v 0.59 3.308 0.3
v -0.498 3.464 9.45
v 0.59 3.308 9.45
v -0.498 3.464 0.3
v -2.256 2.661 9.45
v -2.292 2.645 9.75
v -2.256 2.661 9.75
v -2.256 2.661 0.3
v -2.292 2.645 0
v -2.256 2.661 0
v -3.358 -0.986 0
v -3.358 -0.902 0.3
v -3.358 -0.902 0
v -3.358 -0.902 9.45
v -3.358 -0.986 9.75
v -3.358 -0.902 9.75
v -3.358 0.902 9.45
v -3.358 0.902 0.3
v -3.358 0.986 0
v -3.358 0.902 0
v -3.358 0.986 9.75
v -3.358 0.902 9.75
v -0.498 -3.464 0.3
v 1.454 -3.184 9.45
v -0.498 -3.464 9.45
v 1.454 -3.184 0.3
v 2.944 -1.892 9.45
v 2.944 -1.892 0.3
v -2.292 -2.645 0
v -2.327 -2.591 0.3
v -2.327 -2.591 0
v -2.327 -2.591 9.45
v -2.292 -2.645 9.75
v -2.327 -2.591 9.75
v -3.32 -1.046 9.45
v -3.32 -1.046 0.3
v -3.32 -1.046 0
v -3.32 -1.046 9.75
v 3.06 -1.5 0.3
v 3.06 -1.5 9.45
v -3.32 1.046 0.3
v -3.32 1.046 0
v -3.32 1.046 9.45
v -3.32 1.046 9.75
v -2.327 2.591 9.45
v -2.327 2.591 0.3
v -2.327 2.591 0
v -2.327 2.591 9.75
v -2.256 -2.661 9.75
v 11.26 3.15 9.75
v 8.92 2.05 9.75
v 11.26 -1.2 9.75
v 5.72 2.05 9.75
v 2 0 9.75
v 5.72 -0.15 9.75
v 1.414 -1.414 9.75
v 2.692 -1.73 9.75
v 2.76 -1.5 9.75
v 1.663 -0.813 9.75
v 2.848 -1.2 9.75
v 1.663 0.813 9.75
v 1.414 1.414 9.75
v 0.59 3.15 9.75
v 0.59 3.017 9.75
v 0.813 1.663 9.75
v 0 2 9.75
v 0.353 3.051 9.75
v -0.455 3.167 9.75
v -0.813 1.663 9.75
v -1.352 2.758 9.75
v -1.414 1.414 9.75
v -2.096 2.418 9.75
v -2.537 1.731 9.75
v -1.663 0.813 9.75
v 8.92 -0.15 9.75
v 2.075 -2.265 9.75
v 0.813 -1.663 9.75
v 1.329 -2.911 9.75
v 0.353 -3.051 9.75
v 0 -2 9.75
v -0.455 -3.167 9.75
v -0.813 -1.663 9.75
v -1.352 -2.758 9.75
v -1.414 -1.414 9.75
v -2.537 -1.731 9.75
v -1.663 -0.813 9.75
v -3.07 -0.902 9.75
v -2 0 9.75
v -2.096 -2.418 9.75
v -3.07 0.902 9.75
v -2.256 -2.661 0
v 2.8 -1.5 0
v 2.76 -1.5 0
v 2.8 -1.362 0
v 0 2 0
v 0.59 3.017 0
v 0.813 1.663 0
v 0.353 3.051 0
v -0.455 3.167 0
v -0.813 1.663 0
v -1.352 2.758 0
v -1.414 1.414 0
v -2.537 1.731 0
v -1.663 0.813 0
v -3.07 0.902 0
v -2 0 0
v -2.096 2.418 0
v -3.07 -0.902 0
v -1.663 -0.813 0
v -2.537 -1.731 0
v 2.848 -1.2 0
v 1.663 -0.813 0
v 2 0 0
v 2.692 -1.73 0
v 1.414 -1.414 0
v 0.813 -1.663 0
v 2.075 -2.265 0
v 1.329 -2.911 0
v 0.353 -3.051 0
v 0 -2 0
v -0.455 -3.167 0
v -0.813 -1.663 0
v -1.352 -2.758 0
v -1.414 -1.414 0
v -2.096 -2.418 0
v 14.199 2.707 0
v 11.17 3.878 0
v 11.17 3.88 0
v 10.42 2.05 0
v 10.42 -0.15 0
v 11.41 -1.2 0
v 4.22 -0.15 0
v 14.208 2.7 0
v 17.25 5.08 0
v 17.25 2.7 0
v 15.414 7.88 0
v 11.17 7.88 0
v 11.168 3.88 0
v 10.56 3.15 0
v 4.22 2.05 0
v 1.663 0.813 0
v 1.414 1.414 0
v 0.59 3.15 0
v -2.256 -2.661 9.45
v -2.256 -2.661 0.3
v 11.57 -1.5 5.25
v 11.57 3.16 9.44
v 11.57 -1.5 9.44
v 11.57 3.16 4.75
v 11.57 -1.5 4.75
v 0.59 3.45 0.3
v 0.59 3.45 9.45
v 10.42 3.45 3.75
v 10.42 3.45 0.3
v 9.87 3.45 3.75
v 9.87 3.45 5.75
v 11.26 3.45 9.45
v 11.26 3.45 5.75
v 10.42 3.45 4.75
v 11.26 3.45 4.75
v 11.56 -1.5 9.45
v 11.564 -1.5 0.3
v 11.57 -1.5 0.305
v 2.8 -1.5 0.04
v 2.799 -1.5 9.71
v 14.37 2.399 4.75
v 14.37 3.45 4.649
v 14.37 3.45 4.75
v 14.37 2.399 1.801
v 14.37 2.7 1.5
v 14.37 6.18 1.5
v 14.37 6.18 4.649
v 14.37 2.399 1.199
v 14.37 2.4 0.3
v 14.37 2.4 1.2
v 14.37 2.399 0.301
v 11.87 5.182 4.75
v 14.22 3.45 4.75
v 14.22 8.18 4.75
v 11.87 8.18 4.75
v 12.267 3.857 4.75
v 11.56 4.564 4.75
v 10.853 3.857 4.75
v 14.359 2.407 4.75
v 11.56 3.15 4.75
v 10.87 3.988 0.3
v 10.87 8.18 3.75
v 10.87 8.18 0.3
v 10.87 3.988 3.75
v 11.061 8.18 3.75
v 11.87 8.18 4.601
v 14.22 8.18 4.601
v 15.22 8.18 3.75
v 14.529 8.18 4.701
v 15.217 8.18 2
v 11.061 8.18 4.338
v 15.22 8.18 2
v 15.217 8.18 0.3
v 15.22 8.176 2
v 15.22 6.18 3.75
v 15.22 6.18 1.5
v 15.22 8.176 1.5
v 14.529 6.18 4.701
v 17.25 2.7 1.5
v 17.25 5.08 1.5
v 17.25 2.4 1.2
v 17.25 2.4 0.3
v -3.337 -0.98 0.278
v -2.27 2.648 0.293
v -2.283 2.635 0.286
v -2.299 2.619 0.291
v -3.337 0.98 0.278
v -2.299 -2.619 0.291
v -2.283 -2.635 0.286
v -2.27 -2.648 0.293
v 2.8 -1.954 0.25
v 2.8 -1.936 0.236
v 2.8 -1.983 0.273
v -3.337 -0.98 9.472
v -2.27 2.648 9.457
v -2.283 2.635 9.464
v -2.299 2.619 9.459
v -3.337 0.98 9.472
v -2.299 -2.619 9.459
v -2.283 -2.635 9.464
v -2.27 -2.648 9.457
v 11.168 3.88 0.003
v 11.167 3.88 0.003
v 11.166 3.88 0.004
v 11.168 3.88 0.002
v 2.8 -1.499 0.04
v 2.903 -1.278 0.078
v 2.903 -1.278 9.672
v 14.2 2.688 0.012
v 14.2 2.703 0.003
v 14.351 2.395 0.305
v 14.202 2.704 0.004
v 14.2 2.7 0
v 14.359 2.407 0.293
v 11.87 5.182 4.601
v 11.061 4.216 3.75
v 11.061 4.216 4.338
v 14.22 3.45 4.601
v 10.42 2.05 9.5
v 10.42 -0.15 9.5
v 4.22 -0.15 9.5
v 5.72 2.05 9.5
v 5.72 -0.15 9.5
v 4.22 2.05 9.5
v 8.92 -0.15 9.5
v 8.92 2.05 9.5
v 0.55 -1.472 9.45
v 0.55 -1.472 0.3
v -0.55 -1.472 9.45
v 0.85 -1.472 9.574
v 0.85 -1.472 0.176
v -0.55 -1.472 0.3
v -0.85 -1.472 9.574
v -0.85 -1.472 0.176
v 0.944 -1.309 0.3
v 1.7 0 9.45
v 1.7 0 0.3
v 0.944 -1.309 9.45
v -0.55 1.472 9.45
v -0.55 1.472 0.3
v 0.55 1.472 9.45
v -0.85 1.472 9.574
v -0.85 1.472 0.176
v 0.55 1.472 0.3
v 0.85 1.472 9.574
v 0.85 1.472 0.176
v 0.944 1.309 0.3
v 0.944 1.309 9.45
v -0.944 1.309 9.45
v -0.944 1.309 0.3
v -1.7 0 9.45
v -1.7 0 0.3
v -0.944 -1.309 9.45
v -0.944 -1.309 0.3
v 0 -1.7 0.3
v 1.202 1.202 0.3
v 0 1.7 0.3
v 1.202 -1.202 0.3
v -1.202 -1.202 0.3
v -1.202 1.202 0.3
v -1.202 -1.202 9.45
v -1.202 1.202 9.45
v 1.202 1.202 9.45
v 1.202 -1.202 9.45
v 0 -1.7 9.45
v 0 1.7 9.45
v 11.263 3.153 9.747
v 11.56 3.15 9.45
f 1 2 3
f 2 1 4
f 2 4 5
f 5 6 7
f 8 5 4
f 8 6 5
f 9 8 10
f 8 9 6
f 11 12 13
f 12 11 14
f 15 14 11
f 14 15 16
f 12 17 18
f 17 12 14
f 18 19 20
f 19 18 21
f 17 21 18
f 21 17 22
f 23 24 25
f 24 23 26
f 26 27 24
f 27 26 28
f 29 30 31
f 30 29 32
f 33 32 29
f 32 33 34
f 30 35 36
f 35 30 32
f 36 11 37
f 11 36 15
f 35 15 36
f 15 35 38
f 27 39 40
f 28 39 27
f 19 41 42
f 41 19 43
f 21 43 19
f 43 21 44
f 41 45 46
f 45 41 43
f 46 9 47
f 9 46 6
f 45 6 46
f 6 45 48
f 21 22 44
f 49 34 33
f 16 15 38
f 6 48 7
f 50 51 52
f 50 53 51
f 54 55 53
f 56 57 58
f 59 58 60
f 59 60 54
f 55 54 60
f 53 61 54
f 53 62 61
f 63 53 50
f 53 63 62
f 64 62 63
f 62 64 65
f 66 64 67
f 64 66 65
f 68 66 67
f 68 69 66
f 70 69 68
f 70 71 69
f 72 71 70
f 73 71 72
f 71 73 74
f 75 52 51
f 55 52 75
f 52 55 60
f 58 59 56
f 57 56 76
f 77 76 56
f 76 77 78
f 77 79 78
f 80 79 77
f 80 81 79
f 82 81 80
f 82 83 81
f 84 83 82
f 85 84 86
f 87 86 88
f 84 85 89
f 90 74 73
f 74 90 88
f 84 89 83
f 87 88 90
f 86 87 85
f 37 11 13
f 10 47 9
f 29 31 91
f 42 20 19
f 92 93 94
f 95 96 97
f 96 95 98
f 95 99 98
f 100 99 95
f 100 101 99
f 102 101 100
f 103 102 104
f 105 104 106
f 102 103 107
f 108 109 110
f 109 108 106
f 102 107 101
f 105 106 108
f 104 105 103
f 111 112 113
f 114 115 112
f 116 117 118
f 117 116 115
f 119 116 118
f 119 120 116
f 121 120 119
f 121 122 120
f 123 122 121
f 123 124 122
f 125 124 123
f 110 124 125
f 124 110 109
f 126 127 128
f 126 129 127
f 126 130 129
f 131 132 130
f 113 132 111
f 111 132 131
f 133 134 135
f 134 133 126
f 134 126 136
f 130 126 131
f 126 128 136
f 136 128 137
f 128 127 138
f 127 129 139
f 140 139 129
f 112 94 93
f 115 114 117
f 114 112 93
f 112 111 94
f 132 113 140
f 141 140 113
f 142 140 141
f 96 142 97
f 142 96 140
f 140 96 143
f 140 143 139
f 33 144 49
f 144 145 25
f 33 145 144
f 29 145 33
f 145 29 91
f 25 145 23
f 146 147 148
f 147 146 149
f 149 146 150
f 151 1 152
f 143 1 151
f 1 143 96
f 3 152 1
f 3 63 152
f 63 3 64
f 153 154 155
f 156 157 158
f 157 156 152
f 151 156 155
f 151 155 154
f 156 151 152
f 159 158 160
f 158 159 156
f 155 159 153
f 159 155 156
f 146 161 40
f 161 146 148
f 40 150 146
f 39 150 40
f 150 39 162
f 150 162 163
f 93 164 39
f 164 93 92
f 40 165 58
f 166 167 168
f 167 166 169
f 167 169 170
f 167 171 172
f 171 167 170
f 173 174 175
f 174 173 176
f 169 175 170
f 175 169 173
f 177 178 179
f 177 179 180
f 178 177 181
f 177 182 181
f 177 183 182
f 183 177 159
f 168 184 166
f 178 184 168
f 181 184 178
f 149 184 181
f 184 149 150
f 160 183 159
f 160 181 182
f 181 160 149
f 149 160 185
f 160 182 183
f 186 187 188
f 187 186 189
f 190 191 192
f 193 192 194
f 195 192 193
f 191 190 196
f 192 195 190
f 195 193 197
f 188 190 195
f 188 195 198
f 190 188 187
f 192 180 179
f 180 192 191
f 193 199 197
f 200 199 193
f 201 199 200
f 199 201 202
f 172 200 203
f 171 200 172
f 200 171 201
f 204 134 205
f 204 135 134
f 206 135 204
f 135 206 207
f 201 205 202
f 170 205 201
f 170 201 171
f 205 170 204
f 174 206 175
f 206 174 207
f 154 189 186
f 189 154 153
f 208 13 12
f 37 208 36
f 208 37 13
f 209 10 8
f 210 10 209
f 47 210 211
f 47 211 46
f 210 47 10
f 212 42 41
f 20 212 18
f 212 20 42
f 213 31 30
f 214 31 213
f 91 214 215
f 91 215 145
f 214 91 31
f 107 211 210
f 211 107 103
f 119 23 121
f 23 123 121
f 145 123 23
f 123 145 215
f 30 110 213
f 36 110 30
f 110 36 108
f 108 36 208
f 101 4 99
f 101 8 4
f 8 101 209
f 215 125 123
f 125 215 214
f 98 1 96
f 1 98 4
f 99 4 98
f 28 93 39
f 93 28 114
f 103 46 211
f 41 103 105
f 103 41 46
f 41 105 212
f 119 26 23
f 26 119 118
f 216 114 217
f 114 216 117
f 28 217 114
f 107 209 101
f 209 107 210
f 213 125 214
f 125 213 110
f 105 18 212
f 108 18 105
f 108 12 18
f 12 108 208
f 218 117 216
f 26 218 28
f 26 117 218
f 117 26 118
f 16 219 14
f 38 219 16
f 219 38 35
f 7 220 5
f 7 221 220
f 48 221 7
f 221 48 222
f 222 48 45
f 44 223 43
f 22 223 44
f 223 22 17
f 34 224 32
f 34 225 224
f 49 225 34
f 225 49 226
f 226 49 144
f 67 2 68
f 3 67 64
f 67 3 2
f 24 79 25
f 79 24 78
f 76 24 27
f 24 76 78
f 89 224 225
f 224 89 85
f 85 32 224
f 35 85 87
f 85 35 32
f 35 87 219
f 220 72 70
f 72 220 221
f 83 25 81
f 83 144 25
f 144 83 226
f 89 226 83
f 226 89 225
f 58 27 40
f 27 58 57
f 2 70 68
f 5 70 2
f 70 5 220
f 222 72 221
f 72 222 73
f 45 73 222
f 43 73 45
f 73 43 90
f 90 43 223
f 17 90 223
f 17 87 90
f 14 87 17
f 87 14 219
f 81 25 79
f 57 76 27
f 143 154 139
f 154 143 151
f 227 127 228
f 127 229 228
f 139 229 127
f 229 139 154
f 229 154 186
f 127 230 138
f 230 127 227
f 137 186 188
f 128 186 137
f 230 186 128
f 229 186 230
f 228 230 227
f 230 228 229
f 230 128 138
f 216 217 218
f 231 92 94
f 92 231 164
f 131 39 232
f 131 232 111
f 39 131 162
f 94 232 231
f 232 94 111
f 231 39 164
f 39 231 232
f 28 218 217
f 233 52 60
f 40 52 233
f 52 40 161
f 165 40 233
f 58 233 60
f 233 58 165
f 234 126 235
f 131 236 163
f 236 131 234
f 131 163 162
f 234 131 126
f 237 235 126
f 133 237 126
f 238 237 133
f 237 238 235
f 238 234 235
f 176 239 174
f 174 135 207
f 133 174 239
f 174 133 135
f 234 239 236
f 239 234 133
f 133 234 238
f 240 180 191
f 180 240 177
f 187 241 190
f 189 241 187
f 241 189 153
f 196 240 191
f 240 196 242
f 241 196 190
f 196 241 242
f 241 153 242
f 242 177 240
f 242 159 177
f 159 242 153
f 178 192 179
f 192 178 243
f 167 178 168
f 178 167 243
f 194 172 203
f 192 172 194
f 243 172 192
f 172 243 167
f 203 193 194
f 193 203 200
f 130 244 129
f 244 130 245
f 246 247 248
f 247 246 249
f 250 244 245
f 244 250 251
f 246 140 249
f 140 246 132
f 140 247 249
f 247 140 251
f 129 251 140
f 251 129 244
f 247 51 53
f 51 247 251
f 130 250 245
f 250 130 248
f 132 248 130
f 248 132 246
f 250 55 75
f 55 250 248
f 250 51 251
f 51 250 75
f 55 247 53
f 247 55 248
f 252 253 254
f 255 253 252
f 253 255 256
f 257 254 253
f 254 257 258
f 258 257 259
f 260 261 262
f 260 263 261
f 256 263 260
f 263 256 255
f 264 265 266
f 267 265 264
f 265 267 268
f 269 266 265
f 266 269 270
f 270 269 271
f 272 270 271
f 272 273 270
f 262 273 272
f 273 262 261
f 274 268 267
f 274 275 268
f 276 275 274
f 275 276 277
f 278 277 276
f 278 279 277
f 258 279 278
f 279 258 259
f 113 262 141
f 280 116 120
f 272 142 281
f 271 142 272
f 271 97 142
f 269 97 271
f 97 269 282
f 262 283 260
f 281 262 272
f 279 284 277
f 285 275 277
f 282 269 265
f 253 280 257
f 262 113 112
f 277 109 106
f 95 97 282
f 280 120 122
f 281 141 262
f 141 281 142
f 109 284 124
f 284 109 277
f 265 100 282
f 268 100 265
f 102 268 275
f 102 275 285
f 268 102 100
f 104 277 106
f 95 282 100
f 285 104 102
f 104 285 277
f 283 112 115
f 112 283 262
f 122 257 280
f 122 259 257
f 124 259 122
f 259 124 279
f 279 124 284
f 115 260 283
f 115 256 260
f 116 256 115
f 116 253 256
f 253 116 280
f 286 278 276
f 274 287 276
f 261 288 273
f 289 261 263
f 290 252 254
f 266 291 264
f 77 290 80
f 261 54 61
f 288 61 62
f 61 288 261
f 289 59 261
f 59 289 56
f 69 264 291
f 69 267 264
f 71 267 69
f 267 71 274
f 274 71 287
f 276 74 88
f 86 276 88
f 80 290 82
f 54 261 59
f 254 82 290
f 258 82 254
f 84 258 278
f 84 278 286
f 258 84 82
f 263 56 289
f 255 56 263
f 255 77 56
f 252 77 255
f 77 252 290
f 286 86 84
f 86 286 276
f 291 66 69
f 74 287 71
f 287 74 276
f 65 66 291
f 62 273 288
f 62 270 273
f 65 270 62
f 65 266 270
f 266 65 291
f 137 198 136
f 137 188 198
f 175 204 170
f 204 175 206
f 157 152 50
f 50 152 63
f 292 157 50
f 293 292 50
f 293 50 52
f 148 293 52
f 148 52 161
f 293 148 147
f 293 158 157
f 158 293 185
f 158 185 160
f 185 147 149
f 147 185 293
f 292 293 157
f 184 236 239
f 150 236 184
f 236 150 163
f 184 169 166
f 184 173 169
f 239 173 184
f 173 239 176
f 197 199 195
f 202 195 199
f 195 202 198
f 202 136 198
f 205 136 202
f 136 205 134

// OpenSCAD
// PIRANHA iteration1
// fs lever
// GNU GPL v3
// Usan Siriwardana <usiriwar@uwaterloo.ca> and contributors
// based on Prusa i3 MK3S
// https://reprap.org/wiki/Prusa_i3_MK3

difference(){
	// base
	union(){
		cylinder(h = 9.75, r = 3.5);
		translate([0.59, -1.5, 0])cube([10.98, 4.95, 9.75]);
		translate([10.87, -1.5, 0])cube([3.5, 9.68, 4.75]);
		translate([14.37, 6.18, 0])cube([0.85, 2, 4.75]);
		translate([14.35, 2.4, 0])cube([2.9, 5.78, 1.5]);
		translate([10.56, 3.15, 0])rotate([0, 0, 50.06])translate([0, -0.1, 0])cube([0.95, 0.3 +0.1, 4.75]);
	}
	
	// magnet cutout
	translate([4.22, 3.5 - 5 + 1.35, -0.5])cube([6.2, 2.2, 9 + 1]);
	translate([4.22 + 3/2, 3.5 - 5 + 1.35, 0])cube([3.2, 2.2, 9 + 1]);

	// pin
	translate([0, 0, -0.5])cylinder(h = 9.75 + 1, r = 1.7);
	// chamfers	around pin
	translate([0, 0, -0.3])cylinder(h = 0.6, r1 = 2.3, r2 = 1.7);
	translate([0, 0, 9.75 -0.3])cylinder(h = 0.6, r1 = 1.7, r2 = 2.3);
	difference(){
		translate([0, 0, -0.3])cylinder(h = 0.6, r = 3.6);
		translate([0, 0, -0.3])cylinder(h = 0.6, r1 = 2.9, r2 = 3.5);
		translate([0.59, -1.5, 0])cube([10.98, 4.95, 9.75]);
	}
	difference(){
		translate([0, 0, 9.75-0.3])cylinder(h = 0.6, r = 3.6);
		translate([0, 0, 9.75-0.3])cylinder(h = 0.6, r1 = 3.5, r2 = 2.9);
		translate([0.59, -1.5, 0])cube([10.98, 4.95, 9.75]);
	}
	
	// smaller chamfers
	difference(){	
		translate([0.56, 3.15, 0])rotate([-45, 0, 0])cube([10, 1, 1]);
		translate([10.56, 3.15, 0])rotate([0, -45, 50.06+270])cube([10, 0.95, 10]);
	}
	difference(){
		translate([10.56, 3.15, 0])rotate([0, -90-45, 50.06+270])cube([10, 0.95, 10]);
		translate([0.56, 3.15, 0])rotate([45, 0, 0])cube([10, 1, 1]);
		translate([11.17, 3.88, 0])rotate([0, -45, 0])cube([10, 10, 10]);
	}
	difference(){
		translate([11.17, 3.88, 0])rotate([0, -45-90, 0])cube([10, 10, 10]);
		translate([10.56, 3.15, 0])rotate([0, -45, 50.06+270])cube([10, 0.95, 10]);
	}
	translate([10, 9.68-1.5 - 0.3, 0])rotate([-45, 0, 0])cube([10, 1, 1]);
	difference(){
		translate([2.8, -1.2, 0])rotate([90+45, 0, 0])cube([10, 1, 1]);
		cylinder(h = 0.3, r1 = 3.2, r2 = 3.5);
		translate([0, 0, 0.3])cylinder(h = 1, r = 3.5);
	}
	difference(){
		translate([2.6, -1.2, 9.75])rotate([90+45, 0, 0])cube([10, 1, 1]);
		translate([0, 0, 9.75-0.3])cylinder(h = 0.3, r1 = 3.5, r2 = 3.2);
		translate([0, 0, 9.75-1-0.3])cylinder(h = 1, r = 3.5);
	}
	difference(){
		translate([11.41, -1.2, 0])rotate([45+90, 0, 54.48])translate([-0.5, 0, 0])cube([4.8+0.5, 1, 1]);
		translate([14.2, 2.7, 0])rotate([45, 0, 0])cube([4, 1, 1]);
	}
	difference(){
		translate([14.2, 2.7, 0])rotate([45+90, 0, 0])cube([4, 1, 1]);
		translate([11.41, -1.2, 0])rotate([45, 0, 54.48])translate([-0.5, 0, 0])cube([4.8+0.5, 1, 1]);
	}
	translate([10.87 + 3.5, 2.7, 1.5])rotate([45+90, 0, 0])cube([4, 1, 1]);
	translate([0, 0, 9.75])translate([0.56, 3.15, 0])rotate([-45, 0, 0])cube([15, 1, 1]);
	translate([11.26, -1.5, 9.75])rotate([0, 45, 0])cube([1, 10, 1]);
	translate([11.56, 3.15, 4.75])rotate([0, 0, 45])cube([1, 1, 10]);
	translate([11.56, 3.15, 9.45])rotate([0, -35, 45])cube([1, 1, 1]);	
	
	// fillets
	difference(){
		translate([10.87 - 1, 9.68-1.5-4.73, 4.75 - 1])cube([2, 5, 2]);
		translate([10.87 + 1, 9.68-1.5-4.73, 4.75 - 1])rotate([-90, 0, 0])cylinder(h = 4.73, r = 1);
		translate([10.56, 3.15, 0])rotate([0, 0, 50.06])translate([0, -1, 0])cube([3, 0.3 +1, 4.75]);
	}
	difference(){
		translate([10.87 + 3.5 + 0.85 -1, 9.68-1.5-4.73, 4.75 - 1])cube([2, 5, 2]);
		translate([10.87 + 3.5 + 0.85 -1, 9.68-1.5-4.73, 4.75 - 1])rotate([-90, 0, 0])cylinder(h = 4.73, r = 1);
	}
	
	// large chamfers
	translate([11.57, -1.5, -0.5])rotate([0, 0, 270 + 54.48])cube([10, 4.8, 4.75 + 1]);
	translate([17.27, 5.05, -0.5])rotate([0, 0, 33.26])cube([10, 4.8, 1.5 + 1]);
}
